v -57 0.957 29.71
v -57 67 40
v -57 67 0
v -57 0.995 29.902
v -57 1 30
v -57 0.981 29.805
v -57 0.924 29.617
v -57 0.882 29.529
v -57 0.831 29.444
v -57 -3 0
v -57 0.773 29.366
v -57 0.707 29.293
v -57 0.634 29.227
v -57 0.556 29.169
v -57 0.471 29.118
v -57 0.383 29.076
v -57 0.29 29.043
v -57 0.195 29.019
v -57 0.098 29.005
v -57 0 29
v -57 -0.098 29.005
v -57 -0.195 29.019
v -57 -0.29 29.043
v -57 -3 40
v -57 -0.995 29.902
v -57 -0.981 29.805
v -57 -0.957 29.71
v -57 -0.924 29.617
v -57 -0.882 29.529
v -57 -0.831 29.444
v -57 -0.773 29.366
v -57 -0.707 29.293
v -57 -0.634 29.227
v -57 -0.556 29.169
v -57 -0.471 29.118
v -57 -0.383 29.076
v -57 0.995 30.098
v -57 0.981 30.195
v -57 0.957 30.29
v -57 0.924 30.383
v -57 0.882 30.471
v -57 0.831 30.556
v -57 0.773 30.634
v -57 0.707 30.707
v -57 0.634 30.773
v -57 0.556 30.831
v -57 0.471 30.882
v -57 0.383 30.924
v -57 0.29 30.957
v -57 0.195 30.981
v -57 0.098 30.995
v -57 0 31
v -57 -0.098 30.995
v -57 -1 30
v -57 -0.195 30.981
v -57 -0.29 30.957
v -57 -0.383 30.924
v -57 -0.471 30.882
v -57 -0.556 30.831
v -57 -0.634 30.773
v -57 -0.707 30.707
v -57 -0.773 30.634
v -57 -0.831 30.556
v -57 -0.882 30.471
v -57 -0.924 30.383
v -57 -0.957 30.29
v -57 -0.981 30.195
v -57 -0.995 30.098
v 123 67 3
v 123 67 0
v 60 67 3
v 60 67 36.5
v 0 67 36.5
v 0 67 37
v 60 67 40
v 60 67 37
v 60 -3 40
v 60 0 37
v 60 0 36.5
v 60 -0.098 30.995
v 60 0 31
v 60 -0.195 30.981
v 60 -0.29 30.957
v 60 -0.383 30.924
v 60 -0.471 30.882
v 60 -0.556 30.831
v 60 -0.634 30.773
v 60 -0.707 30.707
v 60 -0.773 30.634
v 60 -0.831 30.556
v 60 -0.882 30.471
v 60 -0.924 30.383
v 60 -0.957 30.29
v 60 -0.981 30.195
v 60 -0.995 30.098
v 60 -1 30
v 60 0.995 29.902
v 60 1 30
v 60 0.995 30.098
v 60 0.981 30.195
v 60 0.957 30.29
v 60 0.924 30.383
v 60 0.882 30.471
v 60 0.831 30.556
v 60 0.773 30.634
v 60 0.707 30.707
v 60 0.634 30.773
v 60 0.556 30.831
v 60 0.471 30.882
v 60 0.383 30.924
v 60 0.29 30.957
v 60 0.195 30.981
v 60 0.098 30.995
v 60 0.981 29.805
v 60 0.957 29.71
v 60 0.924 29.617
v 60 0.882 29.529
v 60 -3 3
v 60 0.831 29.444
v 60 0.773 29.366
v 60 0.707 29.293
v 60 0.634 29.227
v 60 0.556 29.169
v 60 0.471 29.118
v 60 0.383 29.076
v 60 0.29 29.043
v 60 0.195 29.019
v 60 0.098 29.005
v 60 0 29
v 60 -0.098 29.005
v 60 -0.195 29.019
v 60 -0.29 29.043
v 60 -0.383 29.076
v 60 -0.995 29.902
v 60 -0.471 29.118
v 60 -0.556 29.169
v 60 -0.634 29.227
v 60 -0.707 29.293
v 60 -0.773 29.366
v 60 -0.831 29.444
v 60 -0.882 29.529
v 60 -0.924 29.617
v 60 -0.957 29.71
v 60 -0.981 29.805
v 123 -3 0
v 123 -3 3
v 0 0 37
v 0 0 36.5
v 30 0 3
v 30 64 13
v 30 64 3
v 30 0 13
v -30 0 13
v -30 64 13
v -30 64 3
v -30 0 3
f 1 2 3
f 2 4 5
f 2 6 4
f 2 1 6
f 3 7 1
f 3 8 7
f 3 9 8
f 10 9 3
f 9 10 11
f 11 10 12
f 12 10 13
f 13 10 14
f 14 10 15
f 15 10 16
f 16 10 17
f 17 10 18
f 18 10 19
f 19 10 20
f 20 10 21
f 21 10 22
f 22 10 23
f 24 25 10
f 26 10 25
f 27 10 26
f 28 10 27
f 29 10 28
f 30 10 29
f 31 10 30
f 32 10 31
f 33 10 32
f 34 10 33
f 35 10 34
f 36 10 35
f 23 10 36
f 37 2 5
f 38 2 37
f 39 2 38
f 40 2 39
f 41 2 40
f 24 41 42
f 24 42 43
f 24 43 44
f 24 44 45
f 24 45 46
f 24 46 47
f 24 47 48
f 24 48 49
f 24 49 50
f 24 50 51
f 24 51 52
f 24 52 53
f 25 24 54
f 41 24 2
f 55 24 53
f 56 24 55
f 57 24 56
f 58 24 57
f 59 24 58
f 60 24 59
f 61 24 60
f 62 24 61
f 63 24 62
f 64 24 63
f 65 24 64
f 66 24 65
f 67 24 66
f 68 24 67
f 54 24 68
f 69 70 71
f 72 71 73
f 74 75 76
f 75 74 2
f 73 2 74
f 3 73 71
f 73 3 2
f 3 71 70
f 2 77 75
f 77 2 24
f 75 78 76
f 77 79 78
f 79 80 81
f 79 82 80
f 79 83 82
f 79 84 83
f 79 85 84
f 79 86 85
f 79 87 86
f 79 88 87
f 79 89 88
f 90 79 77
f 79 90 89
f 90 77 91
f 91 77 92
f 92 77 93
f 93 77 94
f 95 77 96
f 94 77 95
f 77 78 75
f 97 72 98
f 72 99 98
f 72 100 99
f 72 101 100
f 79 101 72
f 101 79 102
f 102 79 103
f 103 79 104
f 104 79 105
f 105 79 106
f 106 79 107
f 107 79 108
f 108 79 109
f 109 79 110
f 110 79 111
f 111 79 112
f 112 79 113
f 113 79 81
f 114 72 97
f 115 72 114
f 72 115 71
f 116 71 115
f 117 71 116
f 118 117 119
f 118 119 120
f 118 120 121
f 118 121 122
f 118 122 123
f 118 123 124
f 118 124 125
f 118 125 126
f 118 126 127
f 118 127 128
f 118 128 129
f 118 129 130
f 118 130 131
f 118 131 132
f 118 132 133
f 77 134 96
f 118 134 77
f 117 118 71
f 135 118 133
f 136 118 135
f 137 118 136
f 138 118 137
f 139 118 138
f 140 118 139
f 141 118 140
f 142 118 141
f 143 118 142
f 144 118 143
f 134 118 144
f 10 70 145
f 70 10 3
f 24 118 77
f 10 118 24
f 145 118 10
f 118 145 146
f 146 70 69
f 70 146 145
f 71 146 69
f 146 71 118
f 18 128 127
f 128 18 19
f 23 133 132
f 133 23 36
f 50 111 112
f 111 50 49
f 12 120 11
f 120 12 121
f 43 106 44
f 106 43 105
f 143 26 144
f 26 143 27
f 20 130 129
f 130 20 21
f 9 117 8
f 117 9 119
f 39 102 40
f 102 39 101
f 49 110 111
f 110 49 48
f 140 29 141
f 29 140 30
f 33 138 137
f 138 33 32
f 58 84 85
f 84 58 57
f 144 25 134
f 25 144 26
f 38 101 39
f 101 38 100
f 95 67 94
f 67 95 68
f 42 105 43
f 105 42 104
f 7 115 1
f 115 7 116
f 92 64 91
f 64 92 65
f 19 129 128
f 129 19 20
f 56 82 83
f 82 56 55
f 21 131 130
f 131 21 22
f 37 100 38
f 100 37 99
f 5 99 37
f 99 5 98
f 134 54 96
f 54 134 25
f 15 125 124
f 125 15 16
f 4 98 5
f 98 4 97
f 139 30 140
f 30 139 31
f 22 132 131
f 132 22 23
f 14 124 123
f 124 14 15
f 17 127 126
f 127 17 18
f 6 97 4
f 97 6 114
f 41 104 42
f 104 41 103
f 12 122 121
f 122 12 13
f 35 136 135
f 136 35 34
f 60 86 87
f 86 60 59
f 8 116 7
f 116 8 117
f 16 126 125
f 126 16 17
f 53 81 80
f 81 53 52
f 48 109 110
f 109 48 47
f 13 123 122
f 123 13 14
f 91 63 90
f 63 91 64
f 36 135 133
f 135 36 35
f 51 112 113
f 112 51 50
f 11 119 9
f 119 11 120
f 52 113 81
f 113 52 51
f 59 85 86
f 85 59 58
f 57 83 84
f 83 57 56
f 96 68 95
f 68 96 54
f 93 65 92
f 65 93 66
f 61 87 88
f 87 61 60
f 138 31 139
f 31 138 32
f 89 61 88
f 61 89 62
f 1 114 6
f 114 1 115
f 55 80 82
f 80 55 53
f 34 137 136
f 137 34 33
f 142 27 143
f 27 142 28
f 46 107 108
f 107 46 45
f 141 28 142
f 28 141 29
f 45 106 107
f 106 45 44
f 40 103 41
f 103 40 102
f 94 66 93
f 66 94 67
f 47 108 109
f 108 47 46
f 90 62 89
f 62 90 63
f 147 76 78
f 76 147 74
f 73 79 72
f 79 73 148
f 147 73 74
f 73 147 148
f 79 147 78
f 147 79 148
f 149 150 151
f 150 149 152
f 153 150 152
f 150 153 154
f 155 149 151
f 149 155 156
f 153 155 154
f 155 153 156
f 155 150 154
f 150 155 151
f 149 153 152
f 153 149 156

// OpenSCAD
// Mini horizontal gel-electrophoresis buffer tank
// Print orientation: base on XY plane, open top facing +Z

$fn = 64;

// --- Tank dimensions ---
tank_x = 120;   // outer length (X)
tank_y = 70;    // outer width (Y)
tank_z = 40;    // outer height (Z)

// --- Walls and floor ---
wall = 3;       // wall thickness
floor = 3;      // floor thickness

// --- Gel tray platform ---
plat_x = 60;    // platform length in X
plat_y = tank_y - 2*wall;  // platform spans full inner width (Y)
plat_top_z = 13;  // top of platform (10 mm above inner floor)

// --- Electrode holes ---
hole_d = 2;     // hole diameter
hole_y = 0;     // hole Y position
hole_z = 30;    // hole Z position

// --- Cutting overlap ---
eps = 0.5;      // extension past cut faces

difference() {
    // Tank body
    union() {
        // Side walls and floor
        hull() {
            for (sx = [-1, 1])
                translate([sx * (tank_x/2 - wall), -wall, 0])
                    cube([wall, tank_y, tank_z]);
        }
        // Floor under side walls (overlaps slightly into walls for a clean union)
        translate([-wall, -wall, 0])
            cube([tank_x + 2*wall, tank_y, floor]);
    }

    // Open top: remove everything above z = tank_z - wall
    translate([0, 0, tank_z - wall - eps])
        cube([tank_x, tank_y, eps]);

    // Gel tray platform
    translate([-plat_x/2, 0, floor])
        cube([plat_x, plat_y, plat_top_z - floor]);

    // Electrode holes through end walls along X
    for (x = [-plat_x/2 - 1, plat_x/2 + 1])
        translate([x, hole_y, hole_z])
            rotate([0, 90, 0])
                cylinder(d = hole_d, h = tank_y + 2*wall, center = true);
}
